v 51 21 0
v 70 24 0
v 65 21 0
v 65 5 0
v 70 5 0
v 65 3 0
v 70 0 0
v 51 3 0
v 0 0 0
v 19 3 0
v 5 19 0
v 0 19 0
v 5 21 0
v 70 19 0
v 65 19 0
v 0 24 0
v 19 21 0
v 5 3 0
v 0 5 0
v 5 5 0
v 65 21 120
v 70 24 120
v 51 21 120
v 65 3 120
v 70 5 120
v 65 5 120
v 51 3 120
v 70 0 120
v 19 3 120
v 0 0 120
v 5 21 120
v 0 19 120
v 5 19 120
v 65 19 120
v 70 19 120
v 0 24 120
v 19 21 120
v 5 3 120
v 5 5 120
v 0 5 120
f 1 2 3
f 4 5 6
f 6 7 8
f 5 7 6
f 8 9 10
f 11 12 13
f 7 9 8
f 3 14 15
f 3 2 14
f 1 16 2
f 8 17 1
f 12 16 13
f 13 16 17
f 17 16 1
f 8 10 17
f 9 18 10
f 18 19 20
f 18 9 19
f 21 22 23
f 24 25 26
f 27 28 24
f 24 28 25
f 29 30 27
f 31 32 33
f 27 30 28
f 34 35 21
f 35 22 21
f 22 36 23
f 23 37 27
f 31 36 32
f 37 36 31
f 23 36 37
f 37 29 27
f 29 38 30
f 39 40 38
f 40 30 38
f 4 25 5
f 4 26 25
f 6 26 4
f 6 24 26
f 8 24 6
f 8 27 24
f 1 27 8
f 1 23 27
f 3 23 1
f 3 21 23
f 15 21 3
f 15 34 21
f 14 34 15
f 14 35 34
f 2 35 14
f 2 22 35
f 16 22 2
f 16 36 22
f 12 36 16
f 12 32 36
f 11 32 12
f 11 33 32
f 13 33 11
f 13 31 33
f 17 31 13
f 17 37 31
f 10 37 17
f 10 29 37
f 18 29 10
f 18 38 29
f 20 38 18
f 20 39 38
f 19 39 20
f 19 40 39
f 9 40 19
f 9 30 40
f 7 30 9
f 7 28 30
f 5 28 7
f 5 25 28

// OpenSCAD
$fn = 32;

// ----------------------------------------------------------------------
// T-slot rail: 70 x 24 mm section, 120 mm long
// ----------------------------------------------------------------------

// --- parameters (mm) ---
profile_height = 120;     // extrusion height
profile_points = 20;      // points of the closed outline

profile = [[0, 0], [70, 0], [70, 5], [65, 5], [65, 3], [51, 3], [51, 21], [65, 21], [65, 19], [70, 19], [70, 24], [0, 24], [0, 19], [5, 19], [5, 21], [19, 21], [19, 3], [5, 3], [5, 5], [0, 5]];  // single closed polygon, 20 points, counter clockwise

// --- the one profile operation ---
linear_extrude(height = profile_height) polygon(points = profile);
